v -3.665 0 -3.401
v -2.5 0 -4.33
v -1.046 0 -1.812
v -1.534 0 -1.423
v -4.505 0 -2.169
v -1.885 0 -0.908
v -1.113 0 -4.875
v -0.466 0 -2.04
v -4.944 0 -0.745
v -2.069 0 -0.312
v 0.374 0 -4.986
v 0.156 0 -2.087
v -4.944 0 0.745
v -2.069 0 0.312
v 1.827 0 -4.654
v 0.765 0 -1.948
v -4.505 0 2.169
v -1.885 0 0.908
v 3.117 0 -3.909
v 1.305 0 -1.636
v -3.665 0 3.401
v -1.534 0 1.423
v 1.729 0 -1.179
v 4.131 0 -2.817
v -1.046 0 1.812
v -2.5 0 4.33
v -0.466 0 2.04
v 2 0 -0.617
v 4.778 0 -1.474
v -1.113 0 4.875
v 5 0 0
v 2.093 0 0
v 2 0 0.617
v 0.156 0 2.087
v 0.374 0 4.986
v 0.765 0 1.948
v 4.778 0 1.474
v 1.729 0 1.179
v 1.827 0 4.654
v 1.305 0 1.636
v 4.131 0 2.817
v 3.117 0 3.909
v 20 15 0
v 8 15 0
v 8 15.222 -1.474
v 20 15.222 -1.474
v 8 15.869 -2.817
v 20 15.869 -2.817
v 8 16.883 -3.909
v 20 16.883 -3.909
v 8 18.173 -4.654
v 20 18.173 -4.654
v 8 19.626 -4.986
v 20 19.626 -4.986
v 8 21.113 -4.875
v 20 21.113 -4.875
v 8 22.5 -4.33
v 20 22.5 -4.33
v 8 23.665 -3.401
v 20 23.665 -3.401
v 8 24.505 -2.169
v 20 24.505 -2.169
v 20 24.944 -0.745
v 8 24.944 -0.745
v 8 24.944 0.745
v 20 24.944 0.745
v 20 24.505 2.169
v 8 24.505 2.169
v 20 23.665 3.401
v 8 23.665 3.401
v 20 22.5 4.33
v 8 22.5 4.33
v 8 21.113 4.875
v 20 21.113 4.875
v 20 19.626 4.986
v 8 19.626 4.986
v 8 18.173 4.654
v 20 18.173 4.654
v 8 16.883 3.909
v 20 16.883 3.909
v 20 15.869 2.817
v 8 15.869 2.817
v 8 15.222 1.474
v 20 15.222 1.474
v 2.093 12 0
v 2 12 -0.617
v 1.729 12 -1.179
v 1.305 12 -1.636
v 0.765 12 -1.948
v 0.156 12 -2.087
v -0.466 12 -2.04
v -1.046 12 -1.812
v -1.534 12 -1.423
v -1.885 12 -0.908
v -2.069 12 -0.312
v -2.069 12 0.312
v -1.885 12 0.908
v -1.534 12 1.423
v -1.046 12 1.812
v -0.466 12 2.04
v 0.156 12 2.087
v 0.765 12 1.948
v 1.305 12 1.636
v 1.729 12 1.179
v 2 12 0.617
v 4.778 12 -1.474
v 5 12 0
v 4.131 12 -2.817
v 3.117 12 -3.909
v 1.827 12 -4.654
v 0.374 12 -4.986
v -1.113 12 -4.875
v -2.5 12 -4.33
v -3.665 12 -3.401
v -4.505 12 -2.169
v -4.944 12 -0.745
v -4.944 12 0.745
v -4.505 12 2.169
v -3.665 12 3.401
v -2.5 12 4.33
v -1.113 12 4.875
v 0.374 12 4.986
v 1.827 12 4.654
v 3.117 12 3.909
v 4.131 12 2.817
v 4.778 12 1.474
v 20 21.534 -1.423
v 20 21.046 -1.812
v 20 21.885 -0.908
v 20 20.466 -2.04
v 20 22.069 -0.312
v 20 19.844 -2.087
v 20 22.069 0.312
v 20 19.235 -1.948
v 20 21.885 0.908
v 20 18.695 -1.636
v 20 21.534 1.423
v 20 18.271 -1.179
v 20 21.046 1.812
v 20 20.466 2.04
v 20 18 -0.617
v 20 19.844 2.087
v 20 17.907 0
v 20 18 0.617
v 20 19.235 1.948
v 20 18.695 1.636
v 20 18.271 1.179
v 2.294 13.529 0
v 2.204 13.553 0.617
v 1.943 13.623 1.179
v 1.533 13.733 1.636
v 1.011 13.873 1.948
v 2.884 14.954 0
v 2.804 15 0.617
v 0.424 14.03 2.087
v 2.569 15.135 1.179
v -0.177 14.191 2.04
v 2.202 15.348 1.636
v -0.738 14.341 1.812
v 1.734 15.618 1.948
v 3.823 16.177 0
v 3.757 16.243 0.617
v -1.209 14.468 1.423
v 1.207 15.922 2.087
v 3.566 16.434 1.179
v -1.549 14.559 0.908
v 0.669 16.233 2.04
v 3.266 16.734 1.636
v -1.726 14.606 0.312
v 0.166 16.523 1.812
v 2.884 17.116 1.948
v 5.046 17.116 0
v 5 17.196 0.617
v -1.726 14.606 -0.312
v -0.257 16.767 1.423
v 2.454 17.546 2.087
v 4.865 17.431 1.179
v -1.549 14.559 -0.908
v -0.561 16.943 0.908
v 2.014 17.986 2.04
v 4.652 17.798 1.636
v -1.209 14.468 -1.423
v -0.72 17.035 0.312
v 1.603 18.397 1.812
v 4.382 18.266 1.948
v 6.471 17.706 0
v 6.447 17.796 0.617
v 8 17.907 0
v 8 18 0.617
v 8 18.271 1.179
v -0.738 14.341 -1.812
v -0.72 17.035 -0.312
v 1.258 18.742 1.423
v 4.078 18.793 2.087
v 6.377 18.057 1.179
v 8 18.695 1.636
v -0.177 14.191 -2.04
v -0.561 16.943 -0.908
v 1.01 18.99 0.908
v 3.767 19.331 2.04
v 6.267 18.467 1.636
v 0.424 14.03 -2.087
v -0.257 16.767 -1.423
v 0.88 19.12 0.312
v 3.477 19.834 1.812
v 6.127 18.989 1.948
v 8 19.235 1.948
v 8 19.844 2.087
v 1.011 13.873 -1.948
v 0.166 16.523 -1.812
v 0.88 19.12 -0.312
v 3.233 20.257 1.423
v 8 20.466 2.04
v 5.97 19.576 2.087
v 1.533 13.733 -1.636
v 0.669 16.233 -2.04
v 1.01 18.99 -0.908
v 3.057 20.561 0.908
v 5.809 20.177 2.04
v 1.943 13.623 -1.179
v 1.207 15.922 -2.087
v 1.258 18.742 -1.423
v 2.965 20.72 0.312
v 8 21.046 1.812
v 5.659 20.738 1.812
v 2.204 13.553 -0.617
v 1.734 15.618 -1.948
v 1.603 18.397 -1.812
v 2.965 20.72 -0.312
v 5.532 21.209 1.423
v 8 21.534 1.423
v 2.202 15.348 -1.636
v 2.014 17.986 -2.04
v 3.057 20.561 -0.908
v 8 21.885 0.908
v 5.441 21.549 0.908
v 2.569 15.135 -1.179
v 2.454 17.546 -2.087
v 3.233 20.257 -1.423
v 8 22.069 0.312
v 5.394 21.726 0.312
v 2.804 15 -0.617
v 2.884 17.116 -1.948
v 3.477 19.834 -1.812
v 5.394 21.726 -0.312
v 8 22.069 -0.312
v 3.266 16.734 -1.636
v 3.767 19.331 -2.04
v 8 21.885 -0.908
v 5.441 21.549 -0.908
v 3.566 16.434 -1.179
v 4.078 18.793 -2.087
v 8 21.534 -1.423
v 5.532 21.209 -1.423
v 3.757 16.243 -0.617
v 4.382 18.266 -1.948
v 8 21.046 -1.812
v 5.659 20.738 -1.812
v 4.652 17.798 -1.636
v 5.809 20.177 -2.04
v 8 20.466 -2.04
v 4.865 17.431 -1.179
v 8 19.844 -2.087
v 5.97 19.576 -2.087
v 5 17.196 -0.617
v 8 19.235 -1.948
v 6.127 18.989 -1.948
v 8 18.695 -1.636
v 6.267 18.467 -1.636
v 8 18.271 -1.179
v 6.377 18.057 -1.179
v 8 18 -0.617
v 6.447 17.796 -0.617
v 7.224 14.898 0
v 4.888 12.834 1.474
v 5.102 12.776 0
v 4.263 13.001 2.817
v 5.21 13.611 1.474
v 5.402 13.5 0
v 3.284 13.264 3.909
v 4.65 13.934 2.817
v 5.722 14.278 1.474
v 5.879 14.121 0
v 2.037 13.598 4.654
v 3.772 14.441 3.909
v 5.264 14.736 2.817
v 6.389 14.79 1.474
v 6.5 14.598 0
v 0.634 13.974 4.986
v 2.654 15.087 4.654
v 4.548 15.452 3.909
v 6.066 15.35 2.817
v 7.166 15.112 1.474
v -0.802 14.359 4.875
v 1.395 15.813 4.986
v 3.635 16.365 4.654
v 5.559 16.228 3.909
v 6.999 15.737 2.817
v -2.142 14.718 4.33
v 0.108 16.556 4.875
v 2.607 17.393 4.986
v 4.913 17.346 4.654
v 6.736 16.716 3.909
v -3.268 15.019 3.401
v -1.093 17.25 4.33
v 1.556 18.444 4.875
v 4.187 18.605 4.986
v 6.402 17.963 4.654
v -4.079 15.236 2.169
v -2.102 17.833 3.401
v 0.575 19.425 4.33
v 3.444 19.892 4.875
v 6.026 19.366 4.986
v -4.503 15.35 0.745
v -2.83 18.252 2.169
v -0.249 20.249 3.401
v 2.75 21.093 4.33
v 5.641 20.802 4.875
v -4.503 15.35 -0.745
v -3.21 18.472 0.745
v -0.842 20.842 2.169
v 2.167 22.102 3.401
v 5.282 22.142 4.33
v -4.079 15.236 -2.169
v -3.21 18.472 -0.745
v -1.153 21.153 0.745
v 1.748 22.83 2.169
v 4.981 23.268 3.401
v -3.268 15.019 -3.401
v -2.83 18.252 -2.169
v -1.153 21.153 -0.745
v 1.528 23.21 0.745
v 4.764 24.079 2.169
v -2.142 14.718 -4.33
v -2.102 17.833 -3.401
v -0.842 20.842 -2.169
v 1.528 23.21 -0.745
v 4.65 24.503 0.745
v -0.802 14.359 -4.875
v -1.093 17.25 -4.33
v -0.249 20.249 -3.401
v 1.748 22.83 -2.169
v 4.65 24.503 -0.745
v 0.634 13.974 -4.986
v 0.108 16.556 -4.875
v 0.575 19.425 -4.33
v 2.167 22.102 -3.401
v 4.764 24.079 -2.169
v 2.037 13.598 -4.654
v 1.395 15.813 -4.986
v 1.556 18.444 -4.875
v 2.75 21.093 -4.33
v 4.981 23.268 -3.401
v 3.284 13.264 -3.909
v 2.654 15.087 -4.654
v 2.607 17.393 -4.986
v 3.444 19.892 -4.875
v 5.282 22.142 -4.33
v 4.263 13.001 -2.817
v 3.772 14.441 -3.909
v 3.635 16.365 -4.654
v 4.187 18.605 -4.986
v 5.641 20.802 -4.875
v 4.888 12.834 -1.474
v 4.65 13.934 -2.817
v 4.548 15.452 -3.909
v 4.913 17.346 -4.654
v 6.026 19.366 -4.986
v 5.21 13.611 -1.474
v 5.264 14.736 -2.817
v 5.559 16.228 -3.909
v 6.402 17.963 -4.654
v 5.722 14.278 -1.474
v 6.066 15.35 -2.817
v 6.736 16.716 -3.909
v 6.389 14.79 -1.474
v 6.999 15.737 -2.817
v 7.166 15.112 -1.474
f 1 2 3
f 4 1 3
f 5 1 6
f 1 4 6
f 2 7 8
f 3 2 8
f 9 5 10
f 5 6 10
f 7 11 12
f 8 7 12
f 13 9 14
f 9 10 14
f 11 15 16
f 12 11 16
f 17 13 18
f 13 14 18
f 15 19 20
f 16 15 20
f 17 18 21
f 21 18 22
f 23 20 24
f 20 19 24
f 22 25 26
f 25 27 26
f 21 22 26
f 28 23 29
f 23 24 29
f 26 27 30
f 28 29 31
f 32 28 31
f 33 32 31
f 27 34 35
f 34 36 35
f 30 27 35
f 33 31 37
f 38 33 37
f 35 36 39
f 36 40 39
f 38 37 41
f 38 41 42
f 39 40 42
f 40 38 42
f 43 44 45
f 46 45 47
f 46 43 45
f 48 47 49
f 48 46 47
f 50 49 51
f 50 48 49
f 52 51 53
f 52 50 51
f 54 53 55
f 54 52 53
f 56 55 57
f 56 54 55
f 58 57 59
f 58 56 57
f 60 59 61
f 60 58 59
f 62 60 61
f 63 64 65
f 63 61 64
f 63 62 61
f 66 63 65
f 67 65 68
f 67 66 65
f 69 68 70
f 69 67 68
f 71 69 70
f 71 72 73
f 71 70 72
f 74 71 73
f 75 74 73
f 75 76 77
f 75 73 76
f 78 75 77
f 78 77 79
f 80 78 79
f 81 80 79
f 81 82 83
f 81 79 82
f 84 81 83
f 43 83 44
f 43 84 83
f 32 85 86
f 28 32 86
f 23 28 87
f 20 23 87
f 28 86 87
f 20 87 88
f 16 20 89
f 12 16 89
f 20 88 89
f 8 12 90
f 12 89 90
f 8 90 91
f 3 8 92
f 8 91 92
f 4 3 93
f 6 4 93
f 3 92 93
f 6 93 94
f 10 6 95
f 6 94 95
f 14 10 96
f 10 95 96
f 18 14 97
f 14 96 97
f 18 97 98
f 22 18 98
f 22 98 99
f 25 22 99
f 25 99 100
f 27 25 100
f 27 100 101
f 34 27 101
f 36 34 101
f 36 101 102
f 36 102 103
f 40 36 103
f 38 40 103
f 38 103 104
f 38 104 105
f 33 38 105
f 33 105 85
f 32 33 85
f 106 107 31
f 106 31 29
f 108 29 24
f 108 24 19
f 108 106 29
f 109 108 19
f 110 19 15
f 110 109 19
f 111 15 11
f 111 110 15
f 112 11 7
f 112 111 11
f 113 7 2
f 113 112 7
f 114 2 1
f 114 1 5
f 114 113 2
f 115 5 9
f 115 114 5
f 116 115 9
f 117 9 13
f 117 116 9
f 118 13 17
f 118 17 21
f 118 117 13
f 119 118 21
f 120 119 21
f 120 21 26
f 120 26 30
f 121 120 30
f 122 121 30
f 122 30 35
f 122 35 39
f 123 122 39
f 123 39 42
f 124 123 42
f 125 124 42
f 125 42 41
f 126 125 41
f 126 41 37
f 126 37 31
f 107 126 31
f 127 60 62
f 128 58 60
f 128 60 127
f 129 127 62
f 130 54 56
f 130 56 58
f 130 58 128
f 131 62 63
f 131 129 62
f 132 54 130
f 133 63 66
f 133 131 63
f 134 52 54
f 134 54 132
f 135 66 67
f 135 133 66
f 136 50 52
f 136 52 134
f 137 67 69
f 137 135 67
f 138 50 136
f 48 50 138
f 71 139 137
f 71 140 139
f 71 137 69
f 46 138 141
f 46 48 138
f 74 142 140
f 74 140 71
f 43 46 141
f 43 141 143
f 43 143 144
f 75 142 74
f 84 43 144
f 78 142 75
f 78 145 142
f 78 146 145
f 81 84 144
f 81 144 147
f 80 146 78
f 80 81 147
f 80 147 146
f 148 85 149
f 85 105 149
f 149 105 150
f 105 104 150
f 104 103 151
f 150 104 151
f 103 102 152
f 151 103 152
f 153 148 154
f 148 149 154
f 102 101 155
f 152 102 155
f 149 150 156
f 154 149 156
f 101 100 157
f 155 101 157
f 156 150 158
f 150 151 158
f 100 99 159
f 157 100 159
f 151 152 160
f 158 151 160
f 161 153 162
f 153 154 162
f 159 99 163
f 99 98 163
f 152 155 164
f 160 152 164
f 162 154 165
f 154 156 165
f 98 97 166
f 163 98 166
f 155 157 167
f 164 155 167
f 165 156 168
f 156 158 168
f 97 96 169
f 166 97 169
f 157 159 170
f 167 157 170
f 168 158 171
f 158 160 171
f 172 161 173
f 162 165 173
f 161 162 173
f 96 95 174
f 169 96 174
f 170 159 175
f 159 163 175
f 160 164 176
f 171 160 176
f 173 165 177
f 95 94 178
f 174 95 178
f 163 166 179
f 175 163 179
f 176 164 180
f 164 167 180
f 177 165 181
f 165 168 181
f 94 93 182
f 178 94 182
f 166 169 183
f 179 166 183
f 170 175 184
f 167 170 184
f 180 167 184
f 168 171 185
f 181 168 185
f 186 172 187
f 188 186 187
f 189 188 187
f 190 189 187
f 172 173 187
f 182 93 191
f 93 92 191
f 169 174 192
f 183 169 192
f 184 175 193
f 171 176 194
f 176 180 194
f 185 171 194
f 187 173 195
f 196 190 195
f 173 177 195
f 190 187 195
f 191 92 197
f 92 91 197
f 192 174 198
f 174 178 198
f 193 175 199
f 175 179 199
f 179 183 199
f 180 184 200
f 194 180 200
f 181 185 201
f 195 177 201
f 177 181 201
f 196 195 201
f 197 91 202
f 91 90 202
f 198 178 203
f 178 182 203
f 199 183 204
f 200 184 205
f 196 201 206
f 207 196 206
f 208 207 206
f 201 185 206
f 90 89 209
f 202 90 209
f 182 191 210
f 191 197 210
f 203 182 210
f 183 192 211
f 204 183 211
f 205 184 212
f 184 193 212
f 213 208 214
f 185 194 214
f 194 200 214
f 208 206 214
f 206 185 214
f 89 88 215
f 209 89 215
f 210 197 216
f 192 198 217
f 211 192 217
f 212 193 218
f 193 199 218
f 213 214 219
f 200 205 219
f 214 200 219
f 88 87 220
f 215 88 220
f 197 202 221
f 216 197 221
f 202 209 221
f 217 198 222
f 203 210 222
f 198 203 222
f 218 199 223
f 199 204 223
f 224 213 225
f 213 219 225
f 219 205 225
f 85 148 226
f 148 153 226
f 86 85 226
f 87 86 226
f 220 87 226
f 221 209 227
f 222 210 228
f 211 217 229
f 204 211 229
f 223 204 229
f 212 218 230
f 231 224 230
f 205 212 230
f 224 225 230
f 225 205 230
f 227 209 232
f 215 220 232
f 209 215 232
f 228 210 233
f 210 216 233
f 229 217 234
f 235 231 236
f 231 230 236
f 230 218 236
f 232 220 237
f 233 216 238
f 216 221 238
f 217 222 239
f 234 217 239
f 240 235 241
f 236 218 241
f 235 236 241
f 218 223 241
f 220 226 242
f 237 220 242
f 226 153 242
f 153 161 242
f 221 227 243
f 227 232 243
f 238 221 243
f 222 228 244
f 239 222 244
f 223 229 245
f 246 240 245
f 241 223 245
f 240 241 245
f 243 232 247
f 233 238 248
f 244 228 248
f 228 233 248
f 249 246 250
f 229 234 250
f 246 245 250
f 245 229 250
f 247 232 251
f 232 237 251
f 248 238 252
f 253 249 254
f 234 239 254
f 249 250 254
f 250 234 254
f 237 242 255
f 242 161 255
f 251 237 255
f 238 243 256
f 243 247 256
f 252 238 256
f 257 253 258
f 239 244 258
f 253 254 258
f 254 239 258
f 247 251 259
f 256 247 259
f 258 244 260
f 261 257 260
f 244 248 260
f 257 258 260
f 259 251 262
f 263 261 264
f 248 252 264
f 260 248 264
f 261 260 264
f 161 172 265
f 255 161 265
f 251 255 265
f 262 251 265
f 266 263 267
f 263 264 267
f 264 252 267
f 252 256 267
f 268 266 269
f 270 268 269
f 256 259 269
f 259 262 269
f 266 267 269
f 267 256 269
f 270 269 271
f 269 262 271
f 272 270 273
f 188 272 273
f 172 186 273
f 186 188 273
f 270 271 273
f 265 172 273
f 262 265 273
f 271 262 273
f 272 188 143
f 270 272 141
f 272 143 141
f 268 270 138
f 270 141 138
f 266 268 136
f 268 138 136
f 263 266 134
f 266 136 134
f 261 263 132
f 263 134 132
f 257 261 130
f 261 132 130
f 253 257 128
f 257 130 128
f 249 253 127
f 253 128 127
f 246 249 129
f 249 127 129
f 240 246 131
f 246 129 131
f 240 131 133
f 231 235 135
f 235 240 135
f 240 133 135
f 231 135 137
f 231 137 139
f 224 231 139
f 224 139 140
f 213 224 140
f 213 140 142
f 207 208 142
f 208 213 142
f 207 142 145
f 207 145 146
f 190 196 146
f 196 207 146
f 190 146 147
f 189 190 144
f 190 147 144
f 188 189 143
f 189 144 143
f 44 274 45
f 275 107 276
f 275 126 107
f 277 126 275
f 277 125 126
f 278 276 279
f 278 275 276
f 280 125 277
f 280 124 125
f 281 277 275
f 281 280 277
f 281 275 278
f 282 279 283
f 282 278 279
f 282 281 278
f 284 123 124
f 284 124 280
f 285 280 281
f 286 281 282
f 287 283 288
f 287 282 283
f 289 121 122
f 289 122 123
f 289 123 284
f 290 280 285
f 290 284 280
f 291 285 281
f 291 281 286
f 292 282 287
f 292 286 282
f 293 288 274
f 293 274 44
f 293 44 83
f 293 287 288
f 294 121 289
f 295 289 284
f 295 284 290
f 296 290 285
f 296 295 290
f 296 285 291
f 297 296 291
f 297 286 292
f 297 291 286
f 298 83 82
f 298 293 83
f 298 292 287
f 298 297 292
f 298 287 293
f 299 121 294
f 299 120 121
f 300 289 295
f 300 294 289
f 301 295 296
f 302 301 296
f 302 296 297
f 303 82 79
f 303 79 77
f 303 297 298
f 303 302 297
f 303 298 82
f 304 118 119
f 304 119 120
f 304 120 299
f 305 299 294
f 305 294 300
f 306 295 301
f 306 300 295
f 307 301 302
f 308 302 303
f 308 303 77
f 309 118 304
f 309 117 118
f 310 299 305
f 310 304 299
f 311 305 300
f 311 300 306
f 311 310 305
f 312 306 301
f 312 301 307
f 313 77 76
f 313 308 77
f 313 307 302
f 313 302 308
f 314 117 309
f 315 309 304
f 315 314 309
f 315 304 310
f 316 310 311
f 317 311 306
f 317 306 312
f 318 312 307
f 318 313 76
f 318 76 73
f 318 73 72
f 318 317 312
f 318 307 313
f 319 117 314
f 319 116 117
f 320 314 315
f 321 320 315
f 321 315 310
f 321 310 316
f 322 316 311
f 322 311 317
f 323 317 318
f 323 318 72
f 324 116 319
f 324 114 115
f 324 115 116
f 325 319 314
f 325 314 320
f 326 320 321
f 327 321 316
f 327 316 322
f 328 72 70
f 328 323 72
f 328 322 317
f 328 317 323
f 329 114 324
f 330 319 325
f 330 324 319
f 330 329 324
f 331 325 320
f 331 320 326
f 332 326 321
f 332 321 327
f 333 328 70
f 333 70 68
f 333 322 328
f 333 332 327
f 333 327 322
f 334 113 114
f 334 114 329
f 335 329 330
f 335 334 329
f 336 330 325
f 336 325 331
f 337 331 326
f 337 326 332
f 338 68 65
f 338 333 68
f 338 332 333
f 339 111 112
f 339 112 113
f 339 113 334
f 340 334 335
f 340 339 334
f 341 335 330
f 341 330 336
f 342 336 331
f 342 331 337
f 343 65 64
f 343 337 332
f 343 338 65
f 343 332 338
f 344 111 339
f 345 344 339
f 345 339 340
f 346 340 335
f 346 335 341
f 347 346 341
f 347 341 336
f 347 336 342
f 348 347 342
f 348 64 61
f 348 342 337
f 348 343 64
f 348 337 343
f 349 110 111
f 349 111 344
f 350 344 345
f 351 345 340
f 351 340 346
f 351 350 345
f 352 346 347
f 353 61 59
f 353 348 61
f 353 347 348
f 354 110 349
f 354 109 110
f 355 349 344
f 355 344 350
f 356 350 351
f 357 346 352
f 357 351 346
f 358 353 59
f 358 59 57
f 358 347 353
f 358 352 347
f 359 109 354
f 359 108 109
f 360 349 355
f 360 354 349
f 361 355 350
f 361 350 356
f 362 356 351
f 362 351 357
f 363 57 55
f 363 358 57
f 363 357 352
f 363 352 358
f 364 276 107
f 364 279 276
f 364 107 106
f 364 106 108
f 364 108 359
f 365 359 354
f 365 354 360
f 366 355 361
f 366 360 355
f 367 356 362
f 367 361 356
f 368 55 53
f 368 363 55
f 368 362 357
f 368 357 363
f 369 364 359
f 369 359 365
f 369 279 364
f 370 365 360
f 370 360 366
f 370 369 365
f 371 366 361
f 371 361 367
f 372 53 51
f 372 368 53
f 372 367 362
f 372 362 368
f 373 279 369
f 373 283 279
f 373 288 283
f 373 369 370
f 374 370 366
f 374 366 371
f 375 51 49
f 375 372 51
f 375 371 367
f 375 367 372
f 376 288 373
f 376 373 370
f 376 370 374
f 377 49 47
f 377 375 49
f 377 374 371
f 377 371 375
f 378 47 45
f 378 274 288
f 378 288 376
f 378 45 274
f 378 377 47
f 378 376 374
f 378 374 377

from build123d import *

# Parameters (mm, degrees)
SKETCH_2_R   = 5
SKETCH_2_R_2 = 2.092708753


with BuildPart() as part:
    # 扫描1: sweep along a path in 草图1
    with BuildLine(Plane.XY) as sweep_1_path:
        Line((0, 0), (0, 12))
        ThreePointArc((0, 12), (2.343145751, 17.656854249), (8, 20))
        Line((8, 20), (20, 20))
    # 草图2 → 扫描1 (sweep)
    with BuildSketch(Plane(origin=(0, 0, 0), x_dir=(1, 0, 0), z_dir=(0, 1, 0))):
        Circle(SKETCH_2_R)
        Circle(SKETCH_2_R_2, mode=Mode.SUBTRACT)
    sweep(path=sweep_1_path.line)


solid = part.part
